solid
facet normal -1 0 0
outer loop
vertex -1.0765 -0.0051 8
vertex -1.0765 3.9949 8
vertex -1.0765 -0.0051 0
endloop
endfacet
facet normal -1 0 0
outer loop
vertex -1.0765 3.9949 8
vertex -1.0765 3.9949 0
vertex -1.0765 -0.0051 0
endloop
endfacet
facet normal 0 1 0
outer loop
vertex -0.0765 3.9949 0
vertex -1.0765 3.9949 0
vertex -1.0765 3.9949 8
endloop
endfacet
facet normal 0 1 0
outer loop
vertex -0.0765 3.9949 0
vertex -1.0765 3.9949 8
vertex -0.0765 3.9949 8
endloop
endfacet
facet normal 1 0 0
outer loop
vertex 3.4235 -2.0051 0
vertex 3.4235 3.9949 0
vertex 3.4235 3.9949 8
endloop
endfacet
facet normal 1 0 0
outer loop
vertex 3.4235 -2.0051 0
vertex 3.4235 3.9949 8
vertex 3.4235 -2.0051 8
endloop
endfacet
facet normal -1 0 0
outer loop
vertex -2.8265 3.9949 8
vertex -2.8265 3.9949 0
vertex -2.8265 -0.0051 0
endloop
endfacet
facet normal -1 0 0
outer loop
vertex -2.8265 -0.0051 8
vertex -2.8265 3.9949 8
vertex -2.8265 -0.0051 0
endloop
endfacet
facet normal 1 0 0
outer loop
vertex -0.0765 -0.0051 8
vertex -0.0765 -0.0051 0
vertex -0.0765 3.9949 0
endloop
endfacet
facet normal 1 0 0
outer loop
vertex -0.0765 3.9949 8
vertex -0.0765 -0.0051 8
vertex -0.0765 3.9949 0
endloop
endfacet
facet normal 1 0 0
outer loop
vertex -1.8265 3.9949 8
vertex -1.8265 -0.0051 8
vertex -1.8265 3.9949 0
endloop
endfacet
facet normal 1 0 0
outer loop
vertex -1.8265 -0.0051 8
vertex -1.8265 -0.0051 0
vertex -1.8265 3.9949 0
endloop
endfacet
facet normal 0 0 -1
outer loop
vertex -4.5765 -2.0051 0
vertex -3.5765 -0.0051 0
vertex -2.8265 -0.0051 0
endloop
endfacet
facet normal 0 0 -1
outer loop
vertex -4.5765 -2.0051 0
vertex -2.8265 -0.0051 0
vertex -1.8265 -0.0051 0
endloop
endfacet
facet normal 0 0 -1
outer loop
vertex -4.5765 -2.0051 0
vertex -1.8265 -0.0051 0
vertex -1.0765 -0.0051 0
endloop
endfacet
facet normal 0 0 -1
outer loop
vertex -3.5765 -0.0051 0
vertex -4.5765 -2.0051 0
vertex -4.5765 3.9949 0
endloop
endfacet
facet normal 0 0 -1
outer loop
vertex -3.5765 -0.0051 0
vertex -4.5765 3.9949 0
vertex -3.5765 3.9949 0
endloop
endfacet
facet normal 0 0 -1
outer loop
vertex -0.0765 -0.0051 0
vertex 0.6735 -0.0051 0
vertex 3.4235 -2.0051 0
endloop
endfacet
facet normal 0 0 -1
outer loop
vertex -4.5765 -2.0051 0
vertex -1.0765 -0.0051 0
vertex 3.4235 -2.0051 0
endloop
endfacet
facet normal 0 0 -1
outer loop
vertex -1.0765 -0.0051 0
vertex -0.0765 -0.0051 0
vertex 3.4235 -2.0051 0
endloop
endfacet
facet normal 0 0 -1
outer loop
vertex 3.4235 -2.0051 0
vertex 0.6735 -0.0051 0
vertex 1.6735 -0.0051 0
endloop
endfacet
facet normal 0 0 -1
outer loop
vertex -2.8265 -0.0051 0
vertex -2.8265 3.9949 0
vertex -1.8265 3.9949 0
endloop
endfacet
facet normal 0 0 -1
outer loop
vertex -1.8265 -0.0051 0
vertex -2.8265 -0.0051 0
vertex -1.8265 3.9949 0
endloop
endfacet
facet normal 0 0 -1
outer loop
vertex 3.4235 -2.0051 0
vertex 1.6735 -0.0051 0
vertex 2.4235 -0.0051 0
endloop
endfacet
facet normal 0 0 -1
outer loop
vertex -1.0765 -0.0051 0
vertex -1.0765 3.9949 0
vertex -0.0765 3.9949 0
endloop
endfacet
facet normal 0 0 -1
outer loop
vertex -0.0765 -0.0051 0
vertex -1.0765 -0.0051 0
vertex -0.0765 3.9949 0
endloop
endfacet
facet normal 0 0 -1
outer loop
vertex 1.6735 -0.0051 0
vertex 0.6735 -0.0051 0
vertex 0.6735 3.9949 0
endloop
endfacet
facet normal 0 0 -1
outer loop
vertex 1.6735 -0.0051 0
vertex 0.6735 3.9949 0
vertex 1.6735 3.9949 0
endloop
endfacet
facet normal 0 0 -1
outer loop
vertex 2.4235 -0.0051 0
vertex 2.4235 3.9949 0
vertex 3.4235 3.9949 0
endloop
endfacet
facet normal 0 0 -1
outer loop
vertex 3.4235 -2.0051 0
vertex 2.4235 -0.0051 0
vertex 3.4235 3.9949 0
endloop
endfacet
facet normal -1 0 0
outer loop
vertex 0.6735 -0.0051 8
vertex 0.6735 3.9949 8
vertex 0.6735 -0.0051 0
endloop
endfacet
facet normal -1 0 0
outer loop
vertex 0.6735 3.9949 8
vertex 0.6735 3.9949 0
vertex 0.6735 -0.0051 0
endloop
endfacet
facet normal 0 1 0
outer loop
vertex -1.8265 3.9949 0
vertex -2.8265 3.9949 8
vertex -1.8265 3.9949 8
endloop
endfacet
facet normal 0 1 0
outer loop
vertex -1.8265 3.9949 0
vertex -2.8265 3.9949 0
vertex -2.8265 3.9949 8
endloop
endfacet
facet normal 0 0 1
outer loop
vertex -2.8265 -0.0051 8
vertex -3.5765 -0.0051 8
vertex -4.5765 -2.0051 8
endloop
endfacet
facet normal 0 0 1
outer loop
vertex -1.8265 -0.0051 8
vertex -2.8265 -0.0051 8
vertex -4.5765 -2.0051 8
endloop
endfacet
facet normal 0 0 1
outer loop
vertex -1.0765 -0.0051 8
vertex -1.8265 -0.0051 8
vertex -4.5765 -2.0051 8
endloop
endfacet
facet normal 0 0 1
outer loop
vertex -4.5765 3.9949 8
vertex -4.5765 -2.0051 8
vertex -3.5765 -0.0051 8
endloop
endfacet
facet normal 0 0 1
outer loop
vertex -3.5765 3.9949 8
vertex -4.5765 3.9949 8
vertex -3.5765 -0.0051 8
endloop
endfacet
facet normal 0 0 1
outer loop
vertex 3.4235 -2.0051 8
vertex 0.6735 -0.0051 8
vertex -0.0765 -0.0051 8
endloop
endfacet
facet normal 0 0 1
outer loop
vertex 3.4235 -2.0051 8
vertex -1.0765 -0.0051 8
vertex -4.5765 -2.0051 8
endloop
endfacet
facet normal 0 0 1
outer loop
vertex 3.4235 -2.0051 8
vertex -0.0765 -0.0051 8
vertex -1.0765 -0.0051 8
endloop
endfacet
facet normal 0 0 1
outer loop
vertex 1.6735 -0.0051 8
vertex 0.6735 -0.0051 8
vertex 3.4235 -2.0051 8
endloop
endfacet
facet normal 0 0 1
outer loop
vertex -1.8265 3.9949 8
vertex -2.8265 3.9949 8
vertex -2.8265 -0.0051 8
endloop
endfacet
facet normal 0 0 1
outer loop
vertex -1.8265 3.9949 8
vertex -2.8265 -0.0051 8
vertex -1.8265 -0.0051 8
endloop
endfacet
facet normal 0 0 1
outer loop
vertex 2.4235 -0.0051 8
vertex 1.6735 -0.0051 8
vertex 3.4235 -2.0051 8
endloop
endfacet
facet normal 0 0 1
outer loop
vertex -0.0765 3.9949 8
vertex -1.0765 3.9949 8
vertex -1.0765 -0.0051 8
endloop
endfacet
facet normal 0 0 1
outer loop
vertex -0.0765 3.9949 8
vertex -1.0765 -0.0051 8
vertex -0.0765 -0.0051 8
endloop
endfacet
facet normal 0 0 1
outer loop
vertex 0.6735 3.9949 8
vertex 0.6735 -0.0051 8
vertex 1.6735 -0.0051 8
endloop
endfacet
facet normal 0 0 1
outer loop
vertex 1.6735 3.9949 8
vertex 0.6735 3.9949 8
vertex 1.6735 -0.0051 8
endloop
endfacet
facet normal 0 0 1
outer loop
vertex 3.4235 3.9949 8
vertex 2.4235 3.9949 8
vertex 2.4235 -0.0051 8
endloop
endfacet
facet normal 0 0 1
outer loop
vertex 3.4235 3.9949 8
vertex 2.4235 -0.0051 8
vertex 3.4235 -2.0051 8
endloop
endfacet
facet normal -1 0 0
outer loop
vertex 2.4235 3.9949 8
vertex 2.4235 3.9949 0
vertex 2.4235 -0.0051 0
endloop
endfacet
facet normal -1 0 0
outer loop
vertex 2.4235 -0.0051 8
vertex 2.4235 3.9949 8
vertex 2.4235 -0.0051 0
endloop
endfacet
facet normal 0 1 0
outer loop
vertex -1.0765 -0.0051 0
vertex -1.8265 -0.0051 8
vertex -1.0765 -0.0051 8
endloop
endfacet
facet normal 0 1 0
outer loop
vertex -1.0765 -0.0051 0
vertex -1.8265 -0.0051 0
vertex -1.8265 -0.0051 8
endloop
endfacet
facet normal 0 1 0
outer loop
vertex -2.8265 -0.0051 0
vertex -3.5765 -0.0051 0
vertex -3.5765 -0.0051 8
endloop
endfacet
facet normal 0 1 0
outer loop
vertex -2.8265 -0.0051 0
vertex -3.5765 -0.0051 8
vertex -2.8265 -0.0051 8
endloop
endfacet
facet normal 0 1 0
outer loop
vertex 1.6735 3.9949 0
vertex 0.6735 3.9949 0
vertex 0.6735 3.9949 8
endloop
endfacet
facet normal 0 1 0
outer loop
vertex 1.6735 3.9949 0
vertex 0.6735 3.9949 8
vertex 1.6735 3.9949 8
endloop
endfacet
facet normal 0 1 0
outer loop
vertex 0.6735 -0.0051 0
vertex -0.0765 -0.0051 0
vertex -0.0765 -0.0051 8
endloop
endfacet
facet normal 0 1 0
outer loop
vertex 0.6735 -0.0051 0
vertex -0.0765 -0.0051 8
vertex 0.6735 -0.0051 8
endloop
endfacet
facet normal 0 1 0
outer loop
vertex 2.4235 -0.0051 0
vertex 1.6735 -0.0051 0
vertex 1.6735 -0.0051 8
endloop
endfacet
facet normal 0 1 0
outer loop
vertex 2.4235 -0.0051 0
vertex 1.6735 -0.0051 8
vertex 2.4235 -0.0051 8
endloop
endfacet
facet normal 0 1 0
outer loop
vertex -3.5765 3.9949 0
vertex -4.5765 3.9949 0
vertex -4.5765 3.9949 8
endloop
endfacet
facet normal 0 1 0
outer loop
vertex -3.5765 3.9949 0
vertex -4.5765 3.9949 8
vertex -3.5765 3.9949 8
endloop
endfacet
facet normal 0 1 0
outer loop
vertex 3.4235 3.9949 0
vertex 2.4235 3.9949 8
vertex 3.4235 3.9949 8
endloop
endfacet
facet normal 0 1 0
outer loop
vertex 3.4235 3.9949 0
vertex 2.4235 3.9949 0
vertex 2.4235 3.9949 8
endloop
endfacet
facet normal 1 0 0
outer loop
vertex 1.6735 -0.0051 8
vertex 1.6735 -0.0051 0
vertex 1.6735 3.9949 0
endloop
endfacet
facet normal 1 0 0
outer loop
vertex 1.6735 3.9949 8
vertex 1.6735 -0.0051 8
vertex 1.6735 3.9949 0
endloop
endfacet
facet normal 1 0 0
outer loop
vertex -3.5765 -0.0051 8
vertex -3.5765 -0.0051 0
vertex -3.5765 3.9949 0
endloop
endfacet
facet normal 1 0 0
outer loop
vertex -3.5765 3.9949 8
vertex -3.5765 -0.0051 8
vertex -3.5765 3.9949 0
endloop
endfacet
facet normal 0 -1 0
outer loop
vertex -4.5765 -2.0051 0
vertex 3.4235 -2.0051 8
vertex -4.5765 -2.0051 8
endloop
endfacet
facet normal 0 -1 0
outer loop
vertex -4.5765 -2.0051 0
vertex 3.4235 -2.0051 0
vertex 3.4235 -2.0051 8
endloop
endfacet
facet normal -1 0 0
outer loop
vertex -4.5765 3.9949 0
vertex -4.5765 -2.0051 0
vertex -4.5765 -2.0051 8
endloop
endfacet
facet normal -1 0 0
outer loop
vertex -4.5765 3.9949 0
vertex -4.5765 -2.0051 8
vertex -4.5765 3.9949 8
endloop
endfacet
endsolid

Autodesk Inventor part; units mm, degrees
ref_plane "YZ Plane" through (0, 0, 0) normal (1, 0, 0) x (0, 1, 0)
ref_plane "XZ Plane" through (0, 0, 0) normal (0, 1, 0) x (-1, 0, 0)
ref_plane "XY Plane" through (0, 0, 0) normal (0, 0, 1) x (1, 0, 0)
sketch "Sketch1" plane through (0, 0, 0) normal (0, 0, 1) x (1, 0, 0)
  line L0 (-4.5765, 3.9949) -> (3.4235, 3.9949)
  line L1 (3.4235, 3.9949) -> (3.4235, -2.0051)
  line L2 (3.4235, -2.0051) -> (-4.5765, -2.0051)
  line L3 (-4.5765, -2.0051) -> (-4.5765, 3.9949)
  line L4 (-4.5765, -0.0051) -> (3.4235, -0.0051)
  line L5 (-3.5765, 3.9949) -> (-2.8265, 3.9949)
  line L6 (-2.8265, 3.9949) -> (-2.8265, -0.0051)
  line L7 (-2.8265, -0.0051) -> (-3.5765, -0.0051)
  line L8 (-3.5765, -0.0051) -> (-3.5765, 3.9949)
  line L9 (-1.8265, 3.9949) -> (-1.0765, 3.9949)
  line L10 (-1.0765, 3.9949) -> (-1.0765, -0.0051)
  line L11 (-1.0765, -0.0051) -> (-1.8265, -0.0051)
  line L12 (-1.8265, -0.0051) -> (-1.8265, 3.9949)
  line L13 (1.6735, 3.9949) -> (2.4235, 3.9949)
  line L14 (2.4235, 3.9949) -> (2.4235, -0.0051)
  line L15 (2.4235, -0.0051) -> (1.6735, -0.0051)
  line L16 (1.6735, -0.0051) -> (1.6735, 3.9949)
  line L17 (-0.0765, 3.9949) -> (0.6735, 3.9949)
  line L18 (0.6735, 3.9949) -> (0.6735, -0.0051)
  line L19 (0.6735, -0.0051) -> (-0.0765, -0.0051)
  line L20 (-0.0765, -0.0051) -> (-0.0765, 3.9949)
  point P0 (0, 0)
  dimension "d0" = 6
  dimension "d1" = 8
  dimension "d2" = 2
  dimension "d3" = 1
  dimension "d4" = 1
  dimension "d5" = 1
  dimension "d6" = 1
  dimension "d7" = 1
  dimension "d8" = 0.75
  dimension "d9" = 0.75
  dimension "d10" = 0.75
extrude "Extrusion1" add sketch "Sketch1" along normal blind 8 contours L0 L8 L4 L3 | L4 L1 L2 L3 | L0 L12 L4 L6 | L0 L20 L4 L10 | L4 L14 L0 L1 | L0 L16 L4 L18
properties part number "SmallHeatsink"
